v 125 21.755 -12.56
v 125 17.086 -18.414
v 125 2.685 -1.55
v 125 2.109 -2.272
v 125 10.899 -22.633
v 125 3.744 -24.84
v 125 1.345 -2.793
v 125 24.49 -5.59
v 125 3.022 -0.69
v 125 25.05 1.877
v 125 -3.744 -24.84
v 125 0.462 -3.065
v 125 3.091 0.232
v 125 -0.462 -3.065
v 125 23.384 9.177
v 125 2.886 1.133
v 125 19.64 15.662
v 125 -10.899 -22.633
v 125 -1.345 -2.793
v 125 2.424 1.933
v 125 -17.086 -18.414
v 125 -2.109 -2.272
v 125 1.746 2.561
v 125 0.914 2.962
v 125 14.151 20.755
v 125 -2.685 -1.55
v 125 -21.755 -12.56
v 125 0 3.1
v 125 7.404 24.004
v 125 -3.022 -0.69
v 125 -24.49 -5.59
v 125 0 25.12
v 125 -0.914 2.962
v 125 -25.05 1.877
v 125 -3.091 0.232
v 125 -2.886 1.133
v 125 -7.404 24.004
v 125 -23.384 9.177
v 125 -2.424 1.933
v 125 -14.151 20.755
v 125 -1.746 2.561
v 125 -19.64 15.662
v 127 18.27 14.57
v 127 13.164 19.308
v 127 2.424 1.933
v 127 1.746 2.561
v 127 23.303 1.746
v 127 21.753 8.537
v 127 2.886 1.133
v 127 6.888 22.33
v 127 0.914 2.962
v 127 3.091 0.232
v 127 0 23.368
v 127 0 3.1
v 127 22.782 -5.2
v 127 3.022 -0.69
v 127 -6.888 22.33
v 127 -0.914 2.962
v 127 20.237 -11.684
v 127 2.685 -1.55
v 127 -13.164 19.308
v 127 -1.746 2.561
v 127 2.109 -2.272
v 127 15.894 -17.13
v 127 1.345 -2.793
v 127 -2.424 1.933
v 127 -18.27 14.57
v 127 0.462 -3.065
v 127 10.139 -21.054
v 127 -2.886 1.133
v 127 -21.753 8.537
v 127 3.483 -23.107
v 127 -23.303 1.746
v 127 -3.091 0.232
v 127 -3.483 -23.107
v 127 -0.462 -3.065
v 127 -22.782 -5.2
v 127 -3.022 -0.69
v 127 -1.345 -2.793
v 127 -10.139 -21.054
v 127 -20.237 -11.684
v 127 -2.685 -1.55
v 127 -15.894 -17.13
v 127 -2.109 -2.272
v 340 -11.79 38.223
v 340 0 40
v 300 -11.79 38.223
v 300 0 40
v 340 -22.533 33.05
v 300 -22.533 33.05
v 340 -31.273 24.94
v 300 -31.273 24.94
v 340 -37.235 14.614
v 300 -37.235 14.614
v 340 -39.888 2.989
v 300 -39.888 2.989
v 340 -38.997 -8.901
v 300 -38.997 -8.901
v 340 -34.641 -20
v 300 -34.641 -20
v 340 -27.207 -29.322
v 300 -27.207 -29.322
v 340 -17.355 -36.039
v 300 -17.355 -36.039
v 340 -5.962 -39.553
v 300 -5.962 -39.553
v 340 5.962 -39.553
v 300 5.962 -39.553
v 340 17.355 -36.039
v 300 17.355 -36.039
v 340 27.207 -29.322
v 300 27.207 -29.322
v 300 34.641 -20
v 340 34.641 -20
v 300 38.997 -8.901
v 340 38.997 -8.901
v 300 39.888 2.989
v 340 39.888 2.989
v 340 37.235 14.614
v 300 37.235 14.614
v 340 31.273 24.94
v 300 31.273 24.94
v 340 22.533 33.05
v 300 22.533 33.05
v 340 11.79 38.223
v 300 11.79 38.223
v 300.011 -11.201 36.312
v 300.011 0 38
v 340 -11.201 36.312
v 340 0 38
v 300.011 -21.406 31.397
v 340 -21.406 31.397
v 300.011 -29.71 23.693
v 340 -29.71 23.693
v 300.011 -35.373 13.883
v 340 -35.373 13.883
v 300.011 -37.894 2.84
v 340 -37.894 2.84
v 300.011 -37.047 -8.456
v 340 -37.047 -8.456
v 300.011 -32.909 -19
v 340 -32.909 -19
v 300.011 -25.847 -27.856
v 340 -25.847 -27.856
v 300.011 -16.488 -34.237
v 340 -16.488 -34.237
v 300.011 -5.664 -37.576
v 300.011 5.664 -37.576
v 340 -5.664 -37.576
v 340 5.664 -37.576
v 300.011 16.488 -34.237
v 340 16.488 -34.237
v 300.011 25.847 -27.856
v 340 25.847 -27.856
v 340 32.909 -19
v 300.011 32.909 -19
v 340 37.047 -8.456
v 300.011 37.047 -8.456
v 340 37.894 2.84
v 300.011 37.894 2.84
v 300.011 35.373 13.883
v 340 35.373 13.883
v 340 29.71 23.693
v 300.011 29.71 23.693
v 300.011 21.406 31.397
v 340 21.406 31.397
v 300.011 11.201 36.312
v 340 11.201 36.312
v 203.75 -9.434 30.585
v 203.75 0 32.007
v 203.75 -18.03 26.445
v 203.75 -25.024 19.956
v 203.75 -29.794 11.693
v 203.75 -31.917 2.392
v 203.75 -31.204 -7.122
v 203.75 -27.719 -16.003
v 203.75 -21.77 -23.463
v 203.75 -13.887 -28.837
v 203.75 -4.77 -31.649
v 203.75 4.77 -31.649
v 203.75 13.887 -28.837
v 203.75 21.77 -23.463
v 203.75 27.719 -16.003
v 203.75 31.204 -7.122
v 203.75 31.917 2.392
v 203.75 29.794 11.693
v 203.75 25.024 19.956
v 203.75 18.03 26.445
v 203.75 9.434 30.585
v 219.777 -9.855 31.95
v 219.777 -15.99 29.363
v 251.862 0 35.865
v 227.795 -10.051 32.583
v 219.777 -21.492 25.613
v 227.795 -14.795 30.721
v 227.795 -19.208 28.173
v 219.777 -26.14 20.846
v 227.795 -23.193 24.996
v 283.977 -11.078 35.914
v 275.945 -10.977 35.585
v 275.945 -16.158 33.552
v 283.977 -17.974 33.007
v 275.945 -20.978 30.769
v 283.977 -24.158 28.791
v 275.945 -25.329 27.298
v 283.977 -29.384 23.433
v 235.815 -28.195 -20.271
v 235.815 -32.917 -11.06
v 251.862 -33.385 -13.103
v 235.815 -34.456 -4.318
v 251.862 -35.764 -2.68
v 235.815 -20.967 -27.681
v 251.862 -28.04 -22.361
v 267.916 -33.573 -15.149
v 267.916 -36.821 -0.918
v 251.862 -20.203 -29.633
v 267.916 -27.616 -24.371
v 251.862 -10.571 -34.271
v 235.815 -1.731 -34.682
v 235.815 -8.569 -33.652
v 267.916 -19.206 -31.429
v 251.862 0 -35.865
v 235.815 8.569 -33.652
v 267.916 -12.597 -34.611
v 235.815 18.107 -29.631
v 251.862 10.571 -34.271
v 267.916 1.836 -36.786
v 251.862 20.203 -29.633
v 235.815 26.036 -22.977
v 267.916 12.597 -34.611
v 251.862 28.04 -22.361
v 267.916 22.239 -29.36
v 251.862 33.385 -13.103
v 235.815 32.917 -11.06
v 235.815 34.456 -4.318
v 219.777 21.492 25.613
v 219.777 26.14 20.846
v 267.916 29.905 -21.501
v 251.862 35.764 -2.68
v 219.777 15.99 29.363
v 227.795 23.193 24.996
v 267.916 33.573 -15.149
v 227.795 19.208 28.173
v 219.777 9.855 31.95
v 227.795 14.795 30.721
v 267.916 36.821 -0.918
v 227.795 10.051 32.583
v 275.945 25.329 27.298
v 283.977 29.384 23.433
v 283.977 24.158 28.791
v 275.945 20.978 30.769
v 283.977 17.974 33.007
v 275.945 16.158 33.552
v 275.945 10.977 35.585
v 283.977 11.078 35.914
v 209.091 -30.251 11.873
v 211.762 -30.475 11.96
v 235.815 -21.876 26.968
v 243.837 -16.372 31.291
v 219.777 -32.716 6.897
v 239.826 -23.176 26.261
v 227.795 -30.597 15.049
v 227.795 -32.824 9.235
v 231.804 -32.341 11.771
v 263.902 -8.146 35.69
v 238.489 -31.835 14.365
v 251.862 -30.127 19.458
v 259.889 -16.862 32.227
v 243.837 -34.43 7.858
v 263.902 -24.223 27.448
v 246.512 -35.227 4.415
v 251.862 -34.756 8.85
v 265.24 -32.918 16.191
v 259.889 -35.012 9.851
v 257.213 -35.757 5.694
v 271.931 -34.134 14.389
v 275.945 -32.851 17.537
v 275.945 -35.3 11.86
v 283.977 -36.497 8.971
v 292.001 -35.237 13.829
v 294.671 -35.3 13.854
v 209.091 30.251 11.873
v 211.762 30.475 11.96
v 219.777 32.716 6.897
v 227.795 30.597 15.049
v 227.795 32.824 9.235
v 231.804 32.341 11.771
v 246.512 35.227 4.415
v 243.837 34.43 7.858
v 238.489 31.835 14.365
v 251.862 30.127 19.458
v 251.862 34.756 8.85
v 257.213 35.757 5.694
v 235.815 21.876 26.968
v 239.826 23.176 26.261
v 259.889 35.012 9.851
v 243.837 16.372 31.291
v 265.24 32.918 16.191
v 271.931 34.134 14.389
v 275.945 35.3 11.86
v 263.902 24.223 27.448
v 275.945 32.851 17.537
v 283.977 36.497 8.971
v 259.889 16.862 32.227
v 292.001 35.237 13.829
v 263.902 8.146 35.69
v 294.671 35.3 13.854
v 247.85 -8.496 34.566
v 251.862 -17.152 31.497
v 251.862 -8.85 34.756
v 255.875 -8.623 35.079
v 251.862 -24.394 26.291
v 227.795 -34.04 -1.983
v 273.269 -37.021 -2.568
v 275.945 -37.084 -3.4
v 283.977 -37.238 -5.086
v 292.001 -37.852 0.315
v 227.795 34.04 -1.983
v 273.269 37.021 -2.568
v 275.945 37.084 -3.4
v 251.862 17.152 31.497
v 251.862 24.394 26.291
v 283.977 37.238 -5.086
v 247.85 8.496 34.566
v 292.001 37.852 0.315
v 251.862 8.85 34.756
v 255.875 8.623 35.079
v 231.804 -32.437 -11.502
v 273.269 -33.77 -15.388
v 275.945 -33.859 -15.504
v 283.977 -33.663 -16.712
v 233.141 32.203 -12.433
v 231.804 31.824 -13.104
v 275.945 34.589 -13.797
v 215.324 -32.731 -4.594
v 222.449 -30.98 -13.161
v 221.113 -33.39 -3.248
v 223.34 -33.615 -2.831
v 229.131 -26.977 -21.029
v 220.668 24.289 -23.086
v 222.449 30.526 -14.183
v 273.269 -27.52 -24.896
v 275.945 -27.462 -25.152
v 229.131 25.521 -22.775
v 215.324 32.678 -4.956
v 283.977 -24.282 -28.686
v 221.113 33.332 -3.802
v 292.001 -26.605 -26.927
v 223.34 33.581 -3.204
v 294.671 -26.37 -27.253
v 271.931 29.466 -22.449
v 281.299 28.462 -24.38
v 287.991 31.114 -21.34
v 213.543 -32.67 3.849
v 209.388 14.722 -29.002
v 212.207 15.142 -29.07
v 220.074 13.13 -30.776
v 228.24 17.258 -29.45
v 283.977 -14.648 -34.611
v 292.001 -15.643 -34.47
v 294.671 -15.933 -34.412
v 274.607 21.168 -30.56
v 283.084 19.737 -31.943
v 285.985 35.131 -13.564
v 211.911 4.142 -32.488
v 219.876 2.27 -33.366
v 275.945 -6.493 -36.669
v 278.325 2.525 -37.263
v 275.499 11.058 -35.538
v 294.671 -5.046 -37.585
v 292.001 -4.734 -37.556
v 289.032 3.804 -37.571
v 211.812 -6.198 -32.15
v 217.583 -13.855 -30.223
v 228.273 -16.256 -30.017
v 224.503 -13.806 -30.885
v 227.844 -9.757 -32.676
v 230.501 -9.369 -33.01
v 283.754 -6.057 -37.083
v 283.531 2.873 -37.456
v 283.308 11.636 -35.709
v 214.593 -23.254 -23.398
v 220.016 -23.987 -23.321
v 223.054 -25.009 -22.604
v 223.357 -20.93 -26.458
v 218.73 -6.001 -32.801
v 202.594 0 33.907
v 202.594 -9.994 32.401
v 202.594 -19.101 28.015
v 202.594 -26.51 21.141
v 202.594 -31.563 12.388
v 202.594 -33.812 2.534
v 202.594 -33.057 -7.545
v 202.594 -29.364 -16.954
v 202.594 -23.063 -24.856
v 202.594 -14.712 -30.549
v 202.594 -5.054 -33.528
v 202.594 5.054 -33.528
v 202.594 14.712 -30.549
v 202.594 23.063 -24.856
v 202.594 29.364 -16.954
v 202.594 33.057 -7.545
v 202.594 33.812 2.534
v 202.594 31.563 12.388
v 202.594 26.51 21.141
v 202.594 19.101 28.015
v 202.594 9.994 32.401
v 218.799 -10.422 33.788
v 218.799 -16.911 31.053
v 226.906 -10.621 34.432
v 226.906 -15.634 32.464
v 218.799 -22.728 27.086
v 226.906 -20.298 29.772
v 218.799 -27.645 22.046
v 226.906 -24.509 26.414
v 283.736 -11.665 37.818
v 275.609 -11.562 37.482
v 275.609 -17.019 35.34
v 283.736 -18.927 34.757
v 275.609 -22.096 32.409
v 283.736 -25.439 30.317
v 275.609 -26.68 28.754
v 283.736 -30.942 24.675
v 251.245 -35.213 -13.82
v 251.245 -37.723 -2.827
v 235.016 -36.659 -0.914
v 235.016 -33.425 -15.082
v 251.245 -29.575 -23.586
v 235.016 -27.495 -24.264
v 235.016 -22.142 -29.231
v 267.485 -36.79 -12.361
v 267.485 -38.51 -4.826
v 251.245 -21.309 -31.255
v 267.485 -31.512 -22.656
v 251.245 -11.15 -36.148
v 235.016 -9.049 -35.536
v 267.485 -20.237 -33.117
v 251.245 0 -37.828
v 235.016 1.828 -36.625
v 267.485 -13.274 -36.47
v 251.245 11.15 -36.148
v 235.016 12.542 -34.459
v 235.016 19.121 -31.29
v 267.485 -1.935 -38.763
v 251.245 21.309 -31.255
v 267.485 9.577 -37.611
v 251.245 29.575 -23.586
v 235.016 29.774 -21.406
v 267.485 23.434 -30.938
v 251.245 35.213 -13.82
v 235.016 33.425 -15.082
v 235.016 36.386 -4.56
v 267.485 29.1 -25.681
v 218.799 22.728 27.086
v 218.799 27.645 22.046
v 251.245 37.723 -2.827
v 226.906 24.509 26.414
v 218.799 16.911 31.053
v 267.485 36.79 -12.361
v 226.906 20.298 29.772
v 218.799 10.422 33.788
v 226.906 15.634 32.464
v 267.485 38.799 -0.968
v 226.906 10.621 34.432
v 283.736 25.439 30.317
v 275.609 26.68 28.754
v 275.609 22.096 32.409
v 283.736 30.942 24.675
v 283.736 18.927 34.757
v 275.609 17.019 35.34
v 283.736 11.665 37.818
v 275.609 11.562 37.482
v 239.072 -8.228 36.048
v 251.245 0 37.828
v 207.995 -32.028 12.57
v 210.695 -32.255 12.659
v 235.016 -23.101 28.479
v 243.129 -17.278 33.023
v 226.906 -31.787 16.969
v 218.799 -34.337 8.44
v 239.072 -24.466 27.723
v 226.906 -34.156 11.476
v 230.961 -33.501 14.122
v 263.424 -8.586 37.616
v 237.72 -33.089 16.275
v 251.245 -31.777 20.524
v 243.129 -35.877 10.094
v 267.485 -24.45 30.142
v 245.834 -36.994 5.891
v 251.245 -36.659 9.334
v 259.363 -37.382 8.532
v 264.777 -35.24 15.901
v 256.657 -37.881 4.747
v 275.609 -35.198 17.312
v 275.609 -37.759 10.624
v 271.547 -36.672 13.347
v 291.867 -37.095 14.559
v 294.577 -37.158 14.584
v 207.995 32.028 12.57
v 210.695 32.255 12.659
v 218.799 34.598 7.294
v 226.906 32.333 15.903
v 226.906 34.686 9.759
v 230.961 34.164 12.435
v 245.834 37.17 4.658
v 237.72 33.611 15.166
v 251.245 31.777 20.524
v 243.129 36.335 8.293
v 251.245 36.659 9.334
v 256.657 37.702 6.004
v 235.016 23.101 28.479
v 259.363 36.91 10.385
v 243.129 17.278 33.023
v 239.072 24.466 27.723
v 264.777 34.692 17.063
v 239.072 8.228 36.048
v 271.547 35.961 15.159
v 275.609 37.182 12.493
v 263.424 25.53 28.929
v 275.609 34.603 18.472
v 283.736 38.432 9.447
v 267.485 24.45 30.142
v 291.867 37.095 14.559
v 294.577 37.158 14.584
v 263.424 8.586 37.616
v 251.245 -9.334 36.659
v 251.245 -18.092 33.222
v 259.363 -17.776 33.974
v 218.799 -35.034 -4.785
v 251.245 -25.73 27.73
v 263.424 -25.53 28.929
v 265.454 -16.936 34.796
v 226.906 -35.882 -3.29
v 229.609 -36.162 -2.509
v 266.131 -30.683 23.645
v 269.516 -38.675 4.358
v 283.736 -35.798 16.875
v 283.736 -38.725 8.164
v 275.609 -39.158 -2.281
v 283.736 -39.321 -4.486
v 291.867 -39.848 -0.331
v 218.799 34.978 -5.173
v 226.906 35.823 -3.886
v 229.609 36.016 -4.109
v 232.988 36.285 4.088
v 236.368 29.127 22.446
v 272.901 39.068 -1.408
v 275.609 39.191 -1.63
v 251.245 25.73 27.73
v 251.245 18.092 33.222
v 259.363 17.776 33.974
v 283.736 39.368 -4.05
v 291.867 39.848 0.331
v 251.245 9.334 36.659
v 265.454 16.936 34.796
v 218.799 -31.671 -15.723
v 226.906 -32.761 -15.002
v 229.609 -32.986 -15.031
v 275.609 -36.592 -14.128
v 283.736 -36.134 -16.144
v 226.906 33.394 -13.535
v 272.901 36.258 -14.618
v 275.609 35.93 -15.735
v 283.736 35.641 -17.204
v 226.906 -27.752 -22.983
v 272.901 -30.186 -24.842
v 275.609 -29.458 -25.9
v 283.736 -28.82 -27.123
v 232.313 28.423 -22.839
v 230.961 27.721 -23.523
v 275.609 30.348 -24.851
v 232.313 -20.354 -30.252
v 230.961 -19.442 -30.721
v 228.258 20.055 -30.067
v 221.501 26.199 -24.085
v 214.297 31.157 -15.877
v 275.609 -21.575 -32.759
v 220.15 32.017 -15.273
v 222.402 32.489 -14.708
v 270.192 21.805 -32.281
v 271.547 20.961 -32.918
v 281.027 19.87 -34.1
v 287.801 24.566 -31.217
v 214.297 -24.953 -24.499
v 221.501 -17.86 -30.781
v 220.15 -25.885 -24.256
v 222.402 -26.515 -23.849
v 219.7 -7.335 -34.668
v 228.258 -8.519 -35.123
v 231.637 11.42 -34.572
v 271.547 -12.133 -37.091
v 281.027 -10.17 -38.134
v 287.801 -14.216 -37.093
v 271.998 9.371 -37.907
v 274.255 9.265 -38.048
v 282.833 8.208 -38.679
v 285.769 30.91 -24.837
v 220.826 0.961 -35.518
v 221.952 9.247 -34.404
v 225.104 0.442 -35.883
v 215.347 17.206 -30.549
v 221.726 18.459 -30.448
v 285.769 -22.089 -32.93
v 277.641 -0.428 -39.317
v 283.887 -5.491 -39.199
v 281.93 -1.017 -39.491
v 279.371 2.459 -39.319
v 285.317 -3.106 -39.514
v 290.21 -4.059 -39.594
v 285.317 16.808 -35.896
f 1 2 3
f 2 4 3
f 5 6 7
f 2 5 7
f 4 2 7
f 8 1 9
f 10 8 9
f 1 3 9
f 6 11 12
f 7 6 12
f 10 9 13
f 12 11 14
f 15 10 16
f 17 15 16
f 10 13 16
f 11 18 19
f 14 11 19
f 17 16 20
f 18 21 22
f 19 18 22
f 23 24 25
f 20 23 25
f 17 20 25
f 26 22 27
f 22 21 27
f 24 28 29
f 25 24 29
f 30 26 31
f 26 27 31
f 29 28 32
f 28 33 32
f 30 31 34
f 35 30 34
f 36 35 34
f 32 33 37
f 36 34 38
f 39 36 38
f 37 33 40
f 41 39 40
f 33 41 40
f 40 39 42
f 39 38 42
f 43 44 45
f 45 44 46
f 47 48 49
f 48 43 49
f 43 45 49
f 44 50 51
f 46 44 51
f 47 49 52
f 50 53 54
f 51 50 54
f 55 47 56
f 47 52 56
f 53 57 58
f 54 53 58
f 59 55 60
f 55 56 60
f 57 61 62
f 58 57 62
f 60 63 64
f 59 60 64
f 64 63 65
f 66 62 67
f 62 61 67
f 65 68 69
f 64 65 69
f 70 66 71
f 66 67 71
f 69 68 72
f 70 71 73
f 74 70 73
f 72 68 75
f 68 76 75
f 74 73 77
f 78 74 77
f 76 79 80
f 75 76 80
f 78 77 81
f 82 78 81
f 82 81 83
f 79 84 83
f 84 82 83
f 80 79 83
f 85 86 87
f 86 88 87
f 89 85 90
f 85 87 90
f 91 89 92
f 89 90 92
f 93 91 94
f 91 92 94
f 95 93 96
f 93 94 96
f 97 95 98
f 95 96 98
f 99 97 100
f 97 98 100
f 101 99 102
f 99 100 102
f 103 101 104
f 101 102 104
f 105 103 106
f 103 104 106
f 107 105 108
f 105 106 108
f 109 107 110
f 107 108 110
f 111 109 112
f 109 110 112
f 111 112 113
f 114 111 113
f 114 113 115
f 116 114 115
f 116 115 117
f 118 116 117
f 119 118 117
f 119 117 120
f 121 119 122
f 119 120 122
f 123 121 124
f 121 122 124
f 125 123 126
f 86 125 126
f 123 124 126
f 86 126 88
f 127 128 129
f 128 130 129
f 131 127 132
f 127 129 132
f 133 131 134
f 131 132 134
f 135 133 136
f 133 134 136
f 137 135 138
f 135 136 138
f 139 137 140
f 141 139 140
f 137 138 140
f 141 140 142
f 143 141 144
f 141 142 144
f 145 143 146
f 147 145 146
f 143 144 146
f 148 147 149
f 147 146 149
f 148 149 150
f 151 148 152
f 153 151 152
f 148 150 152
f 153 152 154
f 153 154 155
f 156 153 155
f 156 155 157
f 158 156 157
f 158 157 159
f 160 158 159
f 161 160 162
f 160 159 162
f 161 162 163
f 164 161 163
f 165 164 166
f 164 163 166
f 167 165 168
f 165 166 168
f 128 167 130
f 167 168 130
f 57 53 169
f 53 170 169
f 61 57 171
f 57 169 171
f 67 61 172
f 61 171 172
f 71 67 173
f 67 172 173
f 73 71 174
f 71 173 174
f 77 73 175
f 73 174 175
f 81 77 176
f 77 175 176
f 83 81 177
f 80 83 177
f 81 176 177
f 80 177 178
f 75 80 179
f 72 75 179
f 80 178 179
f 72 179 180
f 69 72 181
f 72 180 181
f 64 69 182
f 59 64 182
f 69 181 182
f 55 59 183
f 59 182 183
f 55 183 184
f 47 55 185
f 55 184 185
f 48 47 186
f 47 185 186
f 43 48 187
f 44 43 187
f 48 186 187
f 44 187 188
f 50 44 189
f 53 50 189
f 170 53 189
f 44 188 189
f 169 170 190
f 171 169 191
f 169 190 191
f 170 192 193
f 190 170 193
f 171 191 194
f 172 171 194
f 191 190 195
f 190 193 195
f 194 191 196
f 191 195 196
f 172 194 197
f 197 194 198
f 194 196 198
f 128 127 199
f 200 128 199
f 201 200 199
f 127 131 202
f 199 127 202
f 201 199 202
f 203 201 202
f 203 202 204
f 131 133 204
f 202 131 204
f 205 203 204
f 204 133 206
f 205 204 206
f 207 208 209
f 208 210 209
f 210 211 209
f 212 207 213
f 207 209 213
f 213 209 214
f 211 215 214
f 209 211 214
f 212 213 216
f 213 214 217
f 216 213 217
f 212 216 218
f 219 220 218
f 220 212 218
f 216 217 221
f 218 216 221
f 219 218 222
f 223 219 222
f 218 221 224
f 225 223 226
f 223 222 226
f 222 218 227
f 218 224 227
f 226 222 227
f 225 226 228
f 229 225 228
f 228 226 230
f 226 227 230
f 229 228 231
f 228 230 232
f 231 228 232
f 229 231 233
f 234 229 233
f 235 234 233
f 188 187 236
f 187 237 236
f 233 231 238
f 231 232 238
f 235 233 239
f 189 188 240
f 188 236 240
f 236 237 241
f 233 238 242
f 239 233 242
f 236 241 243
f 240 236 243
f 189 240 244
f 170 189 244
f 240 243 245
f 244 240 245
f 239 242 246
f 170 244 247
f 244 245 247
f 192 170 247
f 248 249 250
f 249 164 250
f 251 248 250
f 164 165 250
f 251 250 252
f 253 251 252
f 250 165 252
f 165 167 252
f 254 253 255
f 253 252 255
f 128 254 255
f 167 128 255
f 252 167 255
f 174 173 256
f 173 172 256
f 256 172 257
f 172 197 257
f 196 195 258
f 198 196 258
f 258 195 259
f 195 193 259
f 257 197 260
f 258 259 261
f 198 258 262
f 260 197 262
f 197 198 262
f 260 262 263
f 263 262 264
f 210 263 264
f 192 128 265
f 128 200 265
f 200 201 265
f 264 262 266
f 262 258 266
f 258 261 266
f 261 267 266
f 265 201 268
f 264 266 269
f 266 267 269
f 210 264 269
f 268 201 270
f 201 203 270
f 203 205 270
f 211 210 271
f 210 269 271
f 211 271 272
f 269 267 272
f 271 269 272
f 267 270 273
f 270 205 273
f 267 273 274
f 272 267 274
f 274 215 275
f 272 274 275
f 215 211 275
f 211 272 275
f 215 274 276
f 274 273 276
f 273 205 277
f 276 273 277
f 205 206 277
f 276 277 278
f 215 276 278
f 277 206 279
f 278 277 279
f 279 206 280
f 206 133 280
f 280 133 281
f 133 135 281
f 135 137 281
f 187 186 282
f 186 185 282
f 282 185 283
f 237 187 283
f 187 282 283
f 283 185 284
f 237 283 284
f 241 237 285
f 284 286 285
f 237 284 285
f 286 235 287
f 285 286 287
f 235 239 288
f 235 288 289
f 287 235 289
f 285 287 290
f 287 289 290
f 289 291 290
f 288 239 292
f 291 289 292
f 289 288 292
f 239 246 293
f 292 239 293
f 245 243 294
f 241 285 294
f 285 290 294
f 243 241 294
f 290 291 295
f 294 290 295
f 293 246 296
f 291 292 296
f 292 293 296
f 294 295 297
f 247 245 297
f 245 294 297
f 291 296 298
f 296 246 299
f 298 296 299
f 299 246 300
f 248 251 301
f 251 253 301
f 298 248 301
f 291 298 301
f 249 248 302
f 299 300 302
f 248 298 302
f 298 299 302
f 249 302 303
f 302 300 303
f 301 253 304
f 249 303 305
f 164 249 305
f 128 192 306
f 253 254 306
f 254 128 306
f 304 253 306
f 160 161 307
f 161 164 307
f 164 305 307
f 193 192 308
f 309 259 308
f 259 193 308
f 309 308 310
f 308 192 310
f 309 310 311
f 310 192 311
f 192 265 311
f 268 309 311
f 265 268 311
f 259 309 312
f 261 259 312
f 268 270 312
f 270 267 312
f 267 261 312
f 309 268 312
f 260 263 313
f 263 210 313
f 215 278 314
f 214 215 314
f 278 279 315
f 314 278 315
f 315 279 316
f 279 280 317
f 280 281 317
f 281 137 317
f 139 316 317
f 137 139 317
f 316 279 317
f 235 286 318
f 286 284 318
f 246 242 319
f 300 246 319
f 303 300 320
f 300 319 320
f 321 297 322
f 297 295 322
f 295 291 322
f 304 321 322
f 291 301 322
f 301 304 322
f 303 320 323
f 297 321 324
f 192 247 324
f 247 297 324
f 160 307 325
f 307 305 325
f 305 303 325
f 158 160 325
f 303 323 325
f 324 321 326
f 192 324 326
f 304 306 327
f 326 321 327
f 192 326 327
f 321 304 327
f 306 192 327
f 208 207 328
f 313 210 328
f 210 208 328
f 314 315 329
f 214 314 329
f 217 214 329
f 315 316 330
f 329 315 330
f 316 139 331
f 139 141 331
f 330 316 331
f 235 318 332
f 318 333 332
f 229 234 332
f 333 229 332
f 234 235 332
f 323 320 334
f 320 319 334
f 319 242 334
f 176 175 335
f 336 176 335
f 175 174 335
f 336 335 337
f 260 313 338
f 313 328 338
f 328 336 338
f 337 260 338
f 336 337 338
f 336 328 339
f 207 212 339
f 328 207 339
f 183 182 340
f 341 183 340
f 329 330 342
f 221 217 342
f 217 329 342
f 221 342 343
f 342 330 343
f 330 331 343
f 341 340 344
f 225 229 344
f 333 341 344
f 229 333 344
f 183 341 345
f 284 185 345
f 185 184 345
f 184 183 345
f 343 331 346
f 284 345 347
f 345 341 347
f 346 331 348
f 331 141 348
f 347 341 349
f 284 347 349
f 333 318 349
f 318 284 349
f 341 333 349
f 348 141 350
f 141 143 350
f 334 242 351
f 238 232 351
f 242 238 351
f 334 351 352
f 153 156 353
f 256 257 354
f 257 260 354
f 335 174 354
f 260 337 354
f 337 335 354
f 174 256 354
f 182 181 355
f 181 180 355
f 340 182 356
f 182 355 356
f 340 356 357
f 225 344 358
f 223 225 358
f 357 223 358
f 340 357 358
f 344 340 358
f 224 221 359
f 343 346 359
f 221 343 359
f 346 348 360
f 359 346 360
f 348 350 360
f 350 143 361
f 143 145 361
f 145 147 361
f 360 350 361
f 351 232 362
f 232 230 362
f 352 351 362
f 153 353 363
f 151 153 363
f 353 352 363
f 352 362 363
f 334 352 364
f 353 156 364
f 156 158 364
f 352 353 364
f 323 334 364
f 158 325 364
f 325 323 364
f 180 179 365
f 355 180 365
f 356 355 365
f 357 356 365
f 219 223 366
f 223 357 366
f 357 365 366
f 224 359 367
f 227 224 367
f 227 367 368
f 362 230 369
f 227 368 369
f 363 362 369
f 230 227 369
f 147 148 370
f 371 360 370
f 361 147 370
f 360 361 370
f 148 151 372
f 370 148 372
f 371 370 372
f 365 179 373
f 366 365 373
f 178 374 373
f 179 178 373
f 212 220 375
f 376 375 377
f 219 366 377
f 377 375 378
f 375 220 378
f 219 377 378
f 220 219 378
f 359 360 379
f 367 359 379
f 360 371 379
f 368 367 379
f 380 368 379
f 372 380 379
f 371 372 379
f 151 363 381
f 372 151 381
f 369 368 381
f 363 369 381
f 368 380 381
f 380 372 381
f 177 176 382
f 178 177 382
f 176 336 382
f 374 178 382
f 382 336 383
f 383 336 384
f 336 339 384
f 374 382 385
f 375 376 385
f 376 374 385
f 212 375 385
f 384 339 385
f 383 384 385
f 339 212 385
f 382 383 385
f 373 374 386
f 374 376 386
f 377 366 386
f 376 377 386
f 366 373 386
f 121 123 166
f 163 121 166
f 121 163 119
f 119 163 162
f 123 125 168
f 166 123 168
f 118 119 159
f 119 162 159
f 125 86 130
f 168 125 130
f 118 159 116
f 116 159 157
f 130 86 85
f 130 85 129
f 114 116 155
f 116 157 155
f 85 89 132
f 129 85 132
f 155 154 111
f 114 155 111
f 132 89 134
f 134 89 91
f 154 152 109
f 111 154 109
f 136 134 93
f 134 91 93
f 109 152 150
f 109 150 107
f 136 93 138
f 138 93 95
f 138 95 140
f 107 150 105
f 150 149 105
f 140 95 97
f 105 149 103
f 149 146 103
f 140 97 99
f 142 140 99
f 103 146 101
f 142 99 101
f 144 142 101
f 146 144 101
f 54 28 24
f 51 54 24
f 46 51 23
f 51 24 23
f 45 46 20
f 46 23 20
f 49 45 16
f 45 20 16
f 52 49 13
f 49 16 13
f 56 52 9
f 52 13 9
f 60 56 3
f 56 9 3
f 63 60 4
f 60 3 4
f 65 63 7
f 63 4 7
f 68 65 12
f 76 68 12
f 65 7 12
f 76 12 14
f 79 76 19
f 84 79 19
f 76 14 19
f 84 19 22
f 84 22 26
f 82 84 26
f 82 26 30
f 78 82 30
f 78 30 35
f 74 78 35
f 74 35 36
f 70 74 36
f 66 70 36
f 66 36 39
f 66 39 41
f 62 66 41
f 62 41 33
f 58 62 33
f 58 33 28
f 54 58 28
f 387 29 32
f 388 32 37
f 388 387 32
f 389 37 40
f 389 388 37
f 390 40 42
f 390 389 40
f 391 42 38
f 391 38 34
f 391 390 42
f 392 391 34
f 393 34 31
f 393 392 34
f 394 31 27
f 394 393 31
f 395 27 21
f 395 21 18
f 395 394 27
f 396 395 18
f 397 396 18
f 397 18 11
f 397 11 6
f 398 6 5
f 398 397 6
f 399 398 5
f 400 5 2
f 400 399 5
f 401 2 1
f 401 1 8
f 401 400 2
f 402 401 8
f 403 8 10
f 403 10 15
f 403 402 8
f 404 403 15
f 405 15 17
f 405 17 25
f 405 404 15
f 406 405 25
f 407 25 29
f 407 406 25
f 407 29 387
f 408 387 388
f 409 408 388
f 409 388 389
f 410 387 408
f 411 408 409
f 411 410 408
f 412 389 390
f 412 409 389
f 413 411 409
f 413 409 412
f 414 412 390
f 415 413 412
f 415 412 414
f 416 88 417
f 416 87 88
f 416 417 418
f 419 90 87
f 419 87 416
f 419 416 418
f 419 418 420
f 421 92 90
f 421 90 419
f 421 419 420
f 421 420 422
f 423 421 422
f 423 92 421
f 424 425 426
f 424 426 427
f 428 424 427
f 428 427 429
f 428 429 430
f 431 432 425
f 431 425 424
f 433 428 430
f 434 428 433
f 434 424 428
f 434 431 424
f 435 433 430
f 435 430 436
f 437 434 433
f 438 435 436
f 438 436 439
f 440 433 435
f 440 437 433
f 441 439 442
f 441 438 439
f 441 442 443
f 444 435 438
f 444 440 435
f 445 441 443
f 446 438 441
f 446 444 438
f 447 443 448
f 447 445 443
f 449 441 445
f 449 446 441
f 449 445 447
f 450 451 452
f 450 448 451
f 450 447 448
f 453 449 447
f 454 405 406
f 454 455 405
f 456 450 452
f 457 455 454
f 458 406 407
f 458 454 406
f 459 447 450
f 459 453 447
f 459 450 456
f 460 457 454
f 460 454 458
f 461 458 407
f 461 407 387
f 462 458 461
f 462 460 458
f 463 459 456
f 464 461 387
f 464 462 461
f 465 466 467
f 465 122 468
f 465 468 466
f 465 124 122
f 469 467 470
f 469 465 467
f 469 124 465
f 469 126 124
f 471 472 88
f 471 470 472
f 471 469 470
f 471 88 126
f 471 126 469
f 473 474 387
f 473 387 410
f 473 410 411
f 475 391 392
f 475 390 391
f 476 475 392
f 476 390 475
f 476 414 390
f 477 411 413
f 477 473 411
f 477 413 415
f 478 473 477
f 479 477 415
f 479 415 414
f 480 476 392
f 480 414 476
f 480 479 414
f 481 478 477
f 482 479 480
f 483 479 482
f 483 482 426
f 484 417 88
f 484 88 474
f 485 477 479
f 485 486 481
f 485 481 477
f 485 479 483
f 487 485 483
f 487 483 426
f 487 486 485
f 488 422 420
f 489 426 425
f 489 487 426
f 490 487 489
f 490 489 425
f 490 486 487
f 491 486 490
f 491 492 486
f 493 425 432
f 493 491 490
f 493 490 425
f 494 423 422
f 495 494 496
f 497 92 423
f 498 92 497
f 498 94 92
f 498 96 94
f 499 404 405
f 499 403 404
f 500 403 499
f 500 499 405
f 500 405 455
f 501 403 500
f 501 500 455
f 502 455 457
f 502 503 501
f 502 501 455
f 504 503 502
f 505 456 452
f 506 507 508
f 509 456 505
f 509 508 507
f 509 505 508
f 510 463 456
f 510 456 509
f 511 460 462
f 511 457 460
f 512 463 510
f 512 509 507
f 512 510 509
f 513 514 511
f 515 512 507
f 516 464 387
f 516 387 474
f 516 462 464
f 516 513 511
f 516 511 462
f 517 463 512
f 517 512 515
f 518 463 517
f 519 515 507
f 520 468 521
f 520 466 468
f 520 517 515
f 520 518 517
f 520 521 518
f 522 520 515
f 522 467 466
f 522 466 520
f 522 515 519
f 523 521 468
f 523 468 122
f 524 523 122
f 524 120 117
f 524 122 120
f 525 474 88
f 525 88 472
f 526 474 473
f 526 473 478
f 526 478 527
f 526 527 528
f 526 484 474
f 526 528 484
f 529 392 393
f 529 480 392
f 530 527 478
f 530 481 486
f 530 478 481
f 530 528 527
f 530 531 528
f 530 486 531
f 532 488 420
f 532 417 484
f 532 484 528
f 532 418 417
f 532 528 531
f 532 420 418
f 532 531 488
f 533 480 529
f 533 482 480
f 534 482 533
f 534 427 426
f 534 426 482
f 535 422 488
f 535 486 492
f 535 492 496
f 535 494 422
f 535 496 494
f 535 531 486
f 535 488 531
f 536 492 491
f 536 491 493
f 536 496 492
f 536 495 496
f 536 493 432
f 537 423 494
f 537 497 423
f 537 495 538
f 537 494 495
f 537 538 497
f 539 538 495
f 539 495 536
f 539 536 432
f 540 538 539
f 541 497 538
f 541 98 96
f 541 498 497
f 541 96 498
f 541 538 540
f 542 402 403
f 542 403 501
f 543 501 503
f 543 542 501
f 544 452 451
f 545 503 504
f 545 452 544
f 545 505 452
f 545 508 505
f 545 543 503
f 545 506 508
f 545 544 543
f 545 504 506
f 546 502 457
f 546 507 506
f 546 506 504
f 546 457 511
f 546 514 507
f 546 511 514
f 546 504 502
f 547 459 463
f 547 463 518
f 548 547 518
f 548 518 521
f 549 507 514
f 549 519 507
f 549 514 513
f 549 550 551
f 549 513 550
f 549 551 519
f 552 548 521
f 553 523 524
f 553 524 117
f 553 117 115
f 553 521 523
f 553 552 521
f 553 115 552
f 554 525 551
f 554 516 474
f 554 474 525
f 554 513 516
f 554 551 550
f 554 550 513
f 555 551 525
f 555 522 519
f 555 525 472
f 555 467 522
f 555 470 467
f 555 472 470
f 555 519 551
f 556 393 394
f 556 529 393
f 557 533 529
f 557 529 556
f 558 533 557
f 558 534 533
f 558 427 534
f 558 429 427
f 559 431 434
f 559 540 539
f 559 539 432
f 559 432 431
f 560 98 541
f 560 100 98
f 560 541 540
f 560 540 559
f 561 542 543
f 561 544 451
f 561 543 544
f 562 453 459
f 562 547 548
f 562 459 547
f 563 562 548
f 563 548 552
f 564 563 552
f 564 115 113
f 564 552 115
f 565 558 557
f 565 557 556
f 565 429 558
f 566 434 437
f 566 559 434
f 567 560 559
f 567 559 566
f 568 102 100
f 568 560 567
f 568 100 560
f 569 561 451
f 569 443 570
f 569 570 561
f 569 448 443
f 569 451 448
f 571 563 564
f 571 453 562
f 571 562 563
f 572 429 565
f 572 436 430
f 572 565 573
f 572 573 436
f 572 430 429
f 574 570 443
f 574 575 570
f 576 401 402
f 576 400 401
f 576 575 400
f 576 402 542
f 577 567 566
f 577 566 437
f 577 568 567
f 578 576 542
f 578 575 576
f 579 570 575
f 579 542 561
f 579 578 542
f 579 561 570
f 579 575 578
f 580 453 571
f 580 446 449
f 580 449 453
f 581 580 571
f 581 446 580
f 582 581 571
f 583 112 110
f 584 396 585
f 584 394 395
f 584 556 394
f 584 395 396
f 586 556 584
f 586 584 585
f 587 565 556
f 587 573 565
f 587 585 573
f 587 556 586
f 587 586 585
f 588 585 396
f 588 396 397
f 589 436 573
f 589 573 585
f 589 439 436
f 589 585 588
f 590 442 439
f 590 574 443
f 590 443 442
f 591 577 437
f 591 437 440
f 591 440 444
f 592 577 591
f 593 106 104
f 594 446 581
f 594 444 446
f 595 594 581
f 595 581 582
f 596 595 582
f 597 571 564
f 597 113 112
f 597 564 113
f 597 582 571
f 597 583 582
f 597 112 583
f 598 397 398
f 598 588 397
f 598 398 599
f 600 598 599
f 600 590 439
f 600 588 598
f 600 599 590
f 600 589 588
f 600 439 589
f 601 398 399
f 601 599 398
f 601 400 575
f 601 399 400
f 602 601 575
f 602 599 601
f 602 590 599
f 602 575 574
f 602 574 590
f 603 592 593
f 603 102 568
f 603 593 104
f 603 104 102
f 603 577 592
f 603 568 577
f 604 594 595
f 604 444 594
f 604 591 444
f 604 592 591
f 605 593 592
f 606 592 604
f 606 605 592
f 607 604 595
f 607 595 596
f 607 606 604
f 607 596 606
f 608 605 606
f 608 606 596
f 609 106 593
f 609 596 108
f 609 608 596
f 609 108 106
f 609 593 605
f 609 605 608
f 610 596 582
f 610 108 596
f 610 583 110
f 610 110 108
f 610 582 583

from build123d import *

# Parameters (mm, degrees)
SKETCH3_R          = 3.1
CUT_EXTRUDE1_DEPTH = 223.31734079


with BuildPart() as part:
    # Sketch2 → Revolve1 (revolve)
    with BuildSketch(Plane.XY, mode=Mode.PRIVATE) as revolve1_sk:
        with BuildLine():
            add(Edge.make_bspline(
                [(125, 23.102487634), (125.666615155, 23.191427334), (126.333282144, 23.280003056), (127, 23.368217816)],
                knots=[0.42027122, 0.42027122, 0.42027122, 0.42027122, 0.426924824, 0.426924824, 0.426924824, 0.426924824], degree=3))
            Line((125, 23.102487634), (125, 0))
            Line((125, 0), (127, 0))
            Line((127, 0), (127, 23.368217816))
        make_face()
        with BuildLine():
            add(Edge.make_bspline(
                [(125, 25.120191193), (127.332751625, 25.431081941), (132.331407151, 26.087565456), (140.331004574, 27.10588444), (148.997541828, 28.170567532), (157.997673527, 29.234895992), (166.997785275, 30.258604093), (175.99788006, 31.242125821), (184.997960367, 32.185617854), (193.998028035, 33.088962248), (202.664954428, 33.919819428), (210.99851948, 34.682629582), (218.665386436, 35.352459035), (225.998901833, 35.963660277), (232.998913298, 36.519926308), (239.665734713, 37.022853053), (245.999211125, 37.475811811), (251.666003322, 37.85960313), (256.999453321, 38.201234754), (261.666221352, 38.483732538), (265.999648607, 38.731455183), (269.999647247, 38.947445799), (273.66639347, 39.133060543), (276.999799587, 39.291194487), (279.999798447, 39.424786884), (282.666524002, 39.535197061), (284.999909378, 39.625181506), (286.99990888, 39.697455867), (288.999908328, 39.764500704), (290.666612895, 39.815618833), (292.333279241, 39.862775866), (293.666612296, 39.897137908), (294.999976548, 39.927604539), (295.999976496, 39.948292861), (296.999976131, 39.96663039), (297.999976806, 39.981991095), (298.999972804, 39.99470952), (299.666663128, 39.998236536), (300, 40)],
                knots=[0.421150249, 0.421150249, 0.421150249, 0.421150249, 0.444408212, 0.470975106, 0.5008465, 0.530701571, 0.560541205, 0.590366151, 0.620177045, 0.649974425, 0.679758747, 0.706223046, 0.732677549, 0.755817349, 0.778949888, 0.802075245, 0.821891307, 0.841702158, 0.85820723, 0.874708692, 0.88790726, 0.901103509, 0.914297431, 0.924191338, 0.934083923, 0.943975179, 0.950568607, 0.957161437, 0.963753667, 0.970345292, 0.973640877, 0.980231589, 0.983526714, 0.986821685, 0.9901165, 0.99341116, 0.996705662, 1, 1, 1, 1], degree=3))
            Line((125, 25.120191193), (125, 23.102487634))
            add(Edge.make_bspline(
                [(125, 23.102487634), (125.666615155, 23.191427334), (126.333282144, 23.280003056), (127, 23.368217816)],
                knots=[0.42027122, 0.42027122, 0.42027122, 0.42027122, 0.426924824, 0.426924824, 0.426924824, 0.426924824], degree=3))
            add(Edge.make_bspline(
                [(127, 23.368217816), (128.56568768, 23.575377055), (135.88942536, 24.534911993), (155.75679736, 27.020093999), (186.647560948, 30.453496137), (218.103688818, 33.367517534), (243.296405578, 35.313318367), (262.204681004, 36.552540592), (277.964515807, 37.369612833), (290.582066888, 37.830985967), (296.865005199, 37.983386836), (300.010580524, 38.000027987)],
                knots=[0.426924824, 0.426924824, 0.426924824, 0.426924824, 0.442549824, 0.5, 0.625, 0.75, 0.8125, 0.875, 0.9375, 0.96875, 1, 1, 1, 1], degree=3))
            Line((300.010580524, 38.000027987), (340, 38.000027987))
            Line((340, 38.000027987), (340, 40))
            Line((340, 40), (300, 40))
        make_face()
    revolve(revolve1_sk.sketch.rotate(Axis((0, 0, 0), (1, 0, 0)), 90), axis=Axis((0, 0, 0), (1, 0, 0)))

    # Sketch3 → Cut-Extrude1 (cut, through all)
    with BuildSketch(Plane.ZY.offset(-125)):
        Circle(SKETCH3_R)
    extrude(amount=-CUT_EXTRUDE1_DEPTH, mode=Mode.SUBTRACT)


solid = part.part
